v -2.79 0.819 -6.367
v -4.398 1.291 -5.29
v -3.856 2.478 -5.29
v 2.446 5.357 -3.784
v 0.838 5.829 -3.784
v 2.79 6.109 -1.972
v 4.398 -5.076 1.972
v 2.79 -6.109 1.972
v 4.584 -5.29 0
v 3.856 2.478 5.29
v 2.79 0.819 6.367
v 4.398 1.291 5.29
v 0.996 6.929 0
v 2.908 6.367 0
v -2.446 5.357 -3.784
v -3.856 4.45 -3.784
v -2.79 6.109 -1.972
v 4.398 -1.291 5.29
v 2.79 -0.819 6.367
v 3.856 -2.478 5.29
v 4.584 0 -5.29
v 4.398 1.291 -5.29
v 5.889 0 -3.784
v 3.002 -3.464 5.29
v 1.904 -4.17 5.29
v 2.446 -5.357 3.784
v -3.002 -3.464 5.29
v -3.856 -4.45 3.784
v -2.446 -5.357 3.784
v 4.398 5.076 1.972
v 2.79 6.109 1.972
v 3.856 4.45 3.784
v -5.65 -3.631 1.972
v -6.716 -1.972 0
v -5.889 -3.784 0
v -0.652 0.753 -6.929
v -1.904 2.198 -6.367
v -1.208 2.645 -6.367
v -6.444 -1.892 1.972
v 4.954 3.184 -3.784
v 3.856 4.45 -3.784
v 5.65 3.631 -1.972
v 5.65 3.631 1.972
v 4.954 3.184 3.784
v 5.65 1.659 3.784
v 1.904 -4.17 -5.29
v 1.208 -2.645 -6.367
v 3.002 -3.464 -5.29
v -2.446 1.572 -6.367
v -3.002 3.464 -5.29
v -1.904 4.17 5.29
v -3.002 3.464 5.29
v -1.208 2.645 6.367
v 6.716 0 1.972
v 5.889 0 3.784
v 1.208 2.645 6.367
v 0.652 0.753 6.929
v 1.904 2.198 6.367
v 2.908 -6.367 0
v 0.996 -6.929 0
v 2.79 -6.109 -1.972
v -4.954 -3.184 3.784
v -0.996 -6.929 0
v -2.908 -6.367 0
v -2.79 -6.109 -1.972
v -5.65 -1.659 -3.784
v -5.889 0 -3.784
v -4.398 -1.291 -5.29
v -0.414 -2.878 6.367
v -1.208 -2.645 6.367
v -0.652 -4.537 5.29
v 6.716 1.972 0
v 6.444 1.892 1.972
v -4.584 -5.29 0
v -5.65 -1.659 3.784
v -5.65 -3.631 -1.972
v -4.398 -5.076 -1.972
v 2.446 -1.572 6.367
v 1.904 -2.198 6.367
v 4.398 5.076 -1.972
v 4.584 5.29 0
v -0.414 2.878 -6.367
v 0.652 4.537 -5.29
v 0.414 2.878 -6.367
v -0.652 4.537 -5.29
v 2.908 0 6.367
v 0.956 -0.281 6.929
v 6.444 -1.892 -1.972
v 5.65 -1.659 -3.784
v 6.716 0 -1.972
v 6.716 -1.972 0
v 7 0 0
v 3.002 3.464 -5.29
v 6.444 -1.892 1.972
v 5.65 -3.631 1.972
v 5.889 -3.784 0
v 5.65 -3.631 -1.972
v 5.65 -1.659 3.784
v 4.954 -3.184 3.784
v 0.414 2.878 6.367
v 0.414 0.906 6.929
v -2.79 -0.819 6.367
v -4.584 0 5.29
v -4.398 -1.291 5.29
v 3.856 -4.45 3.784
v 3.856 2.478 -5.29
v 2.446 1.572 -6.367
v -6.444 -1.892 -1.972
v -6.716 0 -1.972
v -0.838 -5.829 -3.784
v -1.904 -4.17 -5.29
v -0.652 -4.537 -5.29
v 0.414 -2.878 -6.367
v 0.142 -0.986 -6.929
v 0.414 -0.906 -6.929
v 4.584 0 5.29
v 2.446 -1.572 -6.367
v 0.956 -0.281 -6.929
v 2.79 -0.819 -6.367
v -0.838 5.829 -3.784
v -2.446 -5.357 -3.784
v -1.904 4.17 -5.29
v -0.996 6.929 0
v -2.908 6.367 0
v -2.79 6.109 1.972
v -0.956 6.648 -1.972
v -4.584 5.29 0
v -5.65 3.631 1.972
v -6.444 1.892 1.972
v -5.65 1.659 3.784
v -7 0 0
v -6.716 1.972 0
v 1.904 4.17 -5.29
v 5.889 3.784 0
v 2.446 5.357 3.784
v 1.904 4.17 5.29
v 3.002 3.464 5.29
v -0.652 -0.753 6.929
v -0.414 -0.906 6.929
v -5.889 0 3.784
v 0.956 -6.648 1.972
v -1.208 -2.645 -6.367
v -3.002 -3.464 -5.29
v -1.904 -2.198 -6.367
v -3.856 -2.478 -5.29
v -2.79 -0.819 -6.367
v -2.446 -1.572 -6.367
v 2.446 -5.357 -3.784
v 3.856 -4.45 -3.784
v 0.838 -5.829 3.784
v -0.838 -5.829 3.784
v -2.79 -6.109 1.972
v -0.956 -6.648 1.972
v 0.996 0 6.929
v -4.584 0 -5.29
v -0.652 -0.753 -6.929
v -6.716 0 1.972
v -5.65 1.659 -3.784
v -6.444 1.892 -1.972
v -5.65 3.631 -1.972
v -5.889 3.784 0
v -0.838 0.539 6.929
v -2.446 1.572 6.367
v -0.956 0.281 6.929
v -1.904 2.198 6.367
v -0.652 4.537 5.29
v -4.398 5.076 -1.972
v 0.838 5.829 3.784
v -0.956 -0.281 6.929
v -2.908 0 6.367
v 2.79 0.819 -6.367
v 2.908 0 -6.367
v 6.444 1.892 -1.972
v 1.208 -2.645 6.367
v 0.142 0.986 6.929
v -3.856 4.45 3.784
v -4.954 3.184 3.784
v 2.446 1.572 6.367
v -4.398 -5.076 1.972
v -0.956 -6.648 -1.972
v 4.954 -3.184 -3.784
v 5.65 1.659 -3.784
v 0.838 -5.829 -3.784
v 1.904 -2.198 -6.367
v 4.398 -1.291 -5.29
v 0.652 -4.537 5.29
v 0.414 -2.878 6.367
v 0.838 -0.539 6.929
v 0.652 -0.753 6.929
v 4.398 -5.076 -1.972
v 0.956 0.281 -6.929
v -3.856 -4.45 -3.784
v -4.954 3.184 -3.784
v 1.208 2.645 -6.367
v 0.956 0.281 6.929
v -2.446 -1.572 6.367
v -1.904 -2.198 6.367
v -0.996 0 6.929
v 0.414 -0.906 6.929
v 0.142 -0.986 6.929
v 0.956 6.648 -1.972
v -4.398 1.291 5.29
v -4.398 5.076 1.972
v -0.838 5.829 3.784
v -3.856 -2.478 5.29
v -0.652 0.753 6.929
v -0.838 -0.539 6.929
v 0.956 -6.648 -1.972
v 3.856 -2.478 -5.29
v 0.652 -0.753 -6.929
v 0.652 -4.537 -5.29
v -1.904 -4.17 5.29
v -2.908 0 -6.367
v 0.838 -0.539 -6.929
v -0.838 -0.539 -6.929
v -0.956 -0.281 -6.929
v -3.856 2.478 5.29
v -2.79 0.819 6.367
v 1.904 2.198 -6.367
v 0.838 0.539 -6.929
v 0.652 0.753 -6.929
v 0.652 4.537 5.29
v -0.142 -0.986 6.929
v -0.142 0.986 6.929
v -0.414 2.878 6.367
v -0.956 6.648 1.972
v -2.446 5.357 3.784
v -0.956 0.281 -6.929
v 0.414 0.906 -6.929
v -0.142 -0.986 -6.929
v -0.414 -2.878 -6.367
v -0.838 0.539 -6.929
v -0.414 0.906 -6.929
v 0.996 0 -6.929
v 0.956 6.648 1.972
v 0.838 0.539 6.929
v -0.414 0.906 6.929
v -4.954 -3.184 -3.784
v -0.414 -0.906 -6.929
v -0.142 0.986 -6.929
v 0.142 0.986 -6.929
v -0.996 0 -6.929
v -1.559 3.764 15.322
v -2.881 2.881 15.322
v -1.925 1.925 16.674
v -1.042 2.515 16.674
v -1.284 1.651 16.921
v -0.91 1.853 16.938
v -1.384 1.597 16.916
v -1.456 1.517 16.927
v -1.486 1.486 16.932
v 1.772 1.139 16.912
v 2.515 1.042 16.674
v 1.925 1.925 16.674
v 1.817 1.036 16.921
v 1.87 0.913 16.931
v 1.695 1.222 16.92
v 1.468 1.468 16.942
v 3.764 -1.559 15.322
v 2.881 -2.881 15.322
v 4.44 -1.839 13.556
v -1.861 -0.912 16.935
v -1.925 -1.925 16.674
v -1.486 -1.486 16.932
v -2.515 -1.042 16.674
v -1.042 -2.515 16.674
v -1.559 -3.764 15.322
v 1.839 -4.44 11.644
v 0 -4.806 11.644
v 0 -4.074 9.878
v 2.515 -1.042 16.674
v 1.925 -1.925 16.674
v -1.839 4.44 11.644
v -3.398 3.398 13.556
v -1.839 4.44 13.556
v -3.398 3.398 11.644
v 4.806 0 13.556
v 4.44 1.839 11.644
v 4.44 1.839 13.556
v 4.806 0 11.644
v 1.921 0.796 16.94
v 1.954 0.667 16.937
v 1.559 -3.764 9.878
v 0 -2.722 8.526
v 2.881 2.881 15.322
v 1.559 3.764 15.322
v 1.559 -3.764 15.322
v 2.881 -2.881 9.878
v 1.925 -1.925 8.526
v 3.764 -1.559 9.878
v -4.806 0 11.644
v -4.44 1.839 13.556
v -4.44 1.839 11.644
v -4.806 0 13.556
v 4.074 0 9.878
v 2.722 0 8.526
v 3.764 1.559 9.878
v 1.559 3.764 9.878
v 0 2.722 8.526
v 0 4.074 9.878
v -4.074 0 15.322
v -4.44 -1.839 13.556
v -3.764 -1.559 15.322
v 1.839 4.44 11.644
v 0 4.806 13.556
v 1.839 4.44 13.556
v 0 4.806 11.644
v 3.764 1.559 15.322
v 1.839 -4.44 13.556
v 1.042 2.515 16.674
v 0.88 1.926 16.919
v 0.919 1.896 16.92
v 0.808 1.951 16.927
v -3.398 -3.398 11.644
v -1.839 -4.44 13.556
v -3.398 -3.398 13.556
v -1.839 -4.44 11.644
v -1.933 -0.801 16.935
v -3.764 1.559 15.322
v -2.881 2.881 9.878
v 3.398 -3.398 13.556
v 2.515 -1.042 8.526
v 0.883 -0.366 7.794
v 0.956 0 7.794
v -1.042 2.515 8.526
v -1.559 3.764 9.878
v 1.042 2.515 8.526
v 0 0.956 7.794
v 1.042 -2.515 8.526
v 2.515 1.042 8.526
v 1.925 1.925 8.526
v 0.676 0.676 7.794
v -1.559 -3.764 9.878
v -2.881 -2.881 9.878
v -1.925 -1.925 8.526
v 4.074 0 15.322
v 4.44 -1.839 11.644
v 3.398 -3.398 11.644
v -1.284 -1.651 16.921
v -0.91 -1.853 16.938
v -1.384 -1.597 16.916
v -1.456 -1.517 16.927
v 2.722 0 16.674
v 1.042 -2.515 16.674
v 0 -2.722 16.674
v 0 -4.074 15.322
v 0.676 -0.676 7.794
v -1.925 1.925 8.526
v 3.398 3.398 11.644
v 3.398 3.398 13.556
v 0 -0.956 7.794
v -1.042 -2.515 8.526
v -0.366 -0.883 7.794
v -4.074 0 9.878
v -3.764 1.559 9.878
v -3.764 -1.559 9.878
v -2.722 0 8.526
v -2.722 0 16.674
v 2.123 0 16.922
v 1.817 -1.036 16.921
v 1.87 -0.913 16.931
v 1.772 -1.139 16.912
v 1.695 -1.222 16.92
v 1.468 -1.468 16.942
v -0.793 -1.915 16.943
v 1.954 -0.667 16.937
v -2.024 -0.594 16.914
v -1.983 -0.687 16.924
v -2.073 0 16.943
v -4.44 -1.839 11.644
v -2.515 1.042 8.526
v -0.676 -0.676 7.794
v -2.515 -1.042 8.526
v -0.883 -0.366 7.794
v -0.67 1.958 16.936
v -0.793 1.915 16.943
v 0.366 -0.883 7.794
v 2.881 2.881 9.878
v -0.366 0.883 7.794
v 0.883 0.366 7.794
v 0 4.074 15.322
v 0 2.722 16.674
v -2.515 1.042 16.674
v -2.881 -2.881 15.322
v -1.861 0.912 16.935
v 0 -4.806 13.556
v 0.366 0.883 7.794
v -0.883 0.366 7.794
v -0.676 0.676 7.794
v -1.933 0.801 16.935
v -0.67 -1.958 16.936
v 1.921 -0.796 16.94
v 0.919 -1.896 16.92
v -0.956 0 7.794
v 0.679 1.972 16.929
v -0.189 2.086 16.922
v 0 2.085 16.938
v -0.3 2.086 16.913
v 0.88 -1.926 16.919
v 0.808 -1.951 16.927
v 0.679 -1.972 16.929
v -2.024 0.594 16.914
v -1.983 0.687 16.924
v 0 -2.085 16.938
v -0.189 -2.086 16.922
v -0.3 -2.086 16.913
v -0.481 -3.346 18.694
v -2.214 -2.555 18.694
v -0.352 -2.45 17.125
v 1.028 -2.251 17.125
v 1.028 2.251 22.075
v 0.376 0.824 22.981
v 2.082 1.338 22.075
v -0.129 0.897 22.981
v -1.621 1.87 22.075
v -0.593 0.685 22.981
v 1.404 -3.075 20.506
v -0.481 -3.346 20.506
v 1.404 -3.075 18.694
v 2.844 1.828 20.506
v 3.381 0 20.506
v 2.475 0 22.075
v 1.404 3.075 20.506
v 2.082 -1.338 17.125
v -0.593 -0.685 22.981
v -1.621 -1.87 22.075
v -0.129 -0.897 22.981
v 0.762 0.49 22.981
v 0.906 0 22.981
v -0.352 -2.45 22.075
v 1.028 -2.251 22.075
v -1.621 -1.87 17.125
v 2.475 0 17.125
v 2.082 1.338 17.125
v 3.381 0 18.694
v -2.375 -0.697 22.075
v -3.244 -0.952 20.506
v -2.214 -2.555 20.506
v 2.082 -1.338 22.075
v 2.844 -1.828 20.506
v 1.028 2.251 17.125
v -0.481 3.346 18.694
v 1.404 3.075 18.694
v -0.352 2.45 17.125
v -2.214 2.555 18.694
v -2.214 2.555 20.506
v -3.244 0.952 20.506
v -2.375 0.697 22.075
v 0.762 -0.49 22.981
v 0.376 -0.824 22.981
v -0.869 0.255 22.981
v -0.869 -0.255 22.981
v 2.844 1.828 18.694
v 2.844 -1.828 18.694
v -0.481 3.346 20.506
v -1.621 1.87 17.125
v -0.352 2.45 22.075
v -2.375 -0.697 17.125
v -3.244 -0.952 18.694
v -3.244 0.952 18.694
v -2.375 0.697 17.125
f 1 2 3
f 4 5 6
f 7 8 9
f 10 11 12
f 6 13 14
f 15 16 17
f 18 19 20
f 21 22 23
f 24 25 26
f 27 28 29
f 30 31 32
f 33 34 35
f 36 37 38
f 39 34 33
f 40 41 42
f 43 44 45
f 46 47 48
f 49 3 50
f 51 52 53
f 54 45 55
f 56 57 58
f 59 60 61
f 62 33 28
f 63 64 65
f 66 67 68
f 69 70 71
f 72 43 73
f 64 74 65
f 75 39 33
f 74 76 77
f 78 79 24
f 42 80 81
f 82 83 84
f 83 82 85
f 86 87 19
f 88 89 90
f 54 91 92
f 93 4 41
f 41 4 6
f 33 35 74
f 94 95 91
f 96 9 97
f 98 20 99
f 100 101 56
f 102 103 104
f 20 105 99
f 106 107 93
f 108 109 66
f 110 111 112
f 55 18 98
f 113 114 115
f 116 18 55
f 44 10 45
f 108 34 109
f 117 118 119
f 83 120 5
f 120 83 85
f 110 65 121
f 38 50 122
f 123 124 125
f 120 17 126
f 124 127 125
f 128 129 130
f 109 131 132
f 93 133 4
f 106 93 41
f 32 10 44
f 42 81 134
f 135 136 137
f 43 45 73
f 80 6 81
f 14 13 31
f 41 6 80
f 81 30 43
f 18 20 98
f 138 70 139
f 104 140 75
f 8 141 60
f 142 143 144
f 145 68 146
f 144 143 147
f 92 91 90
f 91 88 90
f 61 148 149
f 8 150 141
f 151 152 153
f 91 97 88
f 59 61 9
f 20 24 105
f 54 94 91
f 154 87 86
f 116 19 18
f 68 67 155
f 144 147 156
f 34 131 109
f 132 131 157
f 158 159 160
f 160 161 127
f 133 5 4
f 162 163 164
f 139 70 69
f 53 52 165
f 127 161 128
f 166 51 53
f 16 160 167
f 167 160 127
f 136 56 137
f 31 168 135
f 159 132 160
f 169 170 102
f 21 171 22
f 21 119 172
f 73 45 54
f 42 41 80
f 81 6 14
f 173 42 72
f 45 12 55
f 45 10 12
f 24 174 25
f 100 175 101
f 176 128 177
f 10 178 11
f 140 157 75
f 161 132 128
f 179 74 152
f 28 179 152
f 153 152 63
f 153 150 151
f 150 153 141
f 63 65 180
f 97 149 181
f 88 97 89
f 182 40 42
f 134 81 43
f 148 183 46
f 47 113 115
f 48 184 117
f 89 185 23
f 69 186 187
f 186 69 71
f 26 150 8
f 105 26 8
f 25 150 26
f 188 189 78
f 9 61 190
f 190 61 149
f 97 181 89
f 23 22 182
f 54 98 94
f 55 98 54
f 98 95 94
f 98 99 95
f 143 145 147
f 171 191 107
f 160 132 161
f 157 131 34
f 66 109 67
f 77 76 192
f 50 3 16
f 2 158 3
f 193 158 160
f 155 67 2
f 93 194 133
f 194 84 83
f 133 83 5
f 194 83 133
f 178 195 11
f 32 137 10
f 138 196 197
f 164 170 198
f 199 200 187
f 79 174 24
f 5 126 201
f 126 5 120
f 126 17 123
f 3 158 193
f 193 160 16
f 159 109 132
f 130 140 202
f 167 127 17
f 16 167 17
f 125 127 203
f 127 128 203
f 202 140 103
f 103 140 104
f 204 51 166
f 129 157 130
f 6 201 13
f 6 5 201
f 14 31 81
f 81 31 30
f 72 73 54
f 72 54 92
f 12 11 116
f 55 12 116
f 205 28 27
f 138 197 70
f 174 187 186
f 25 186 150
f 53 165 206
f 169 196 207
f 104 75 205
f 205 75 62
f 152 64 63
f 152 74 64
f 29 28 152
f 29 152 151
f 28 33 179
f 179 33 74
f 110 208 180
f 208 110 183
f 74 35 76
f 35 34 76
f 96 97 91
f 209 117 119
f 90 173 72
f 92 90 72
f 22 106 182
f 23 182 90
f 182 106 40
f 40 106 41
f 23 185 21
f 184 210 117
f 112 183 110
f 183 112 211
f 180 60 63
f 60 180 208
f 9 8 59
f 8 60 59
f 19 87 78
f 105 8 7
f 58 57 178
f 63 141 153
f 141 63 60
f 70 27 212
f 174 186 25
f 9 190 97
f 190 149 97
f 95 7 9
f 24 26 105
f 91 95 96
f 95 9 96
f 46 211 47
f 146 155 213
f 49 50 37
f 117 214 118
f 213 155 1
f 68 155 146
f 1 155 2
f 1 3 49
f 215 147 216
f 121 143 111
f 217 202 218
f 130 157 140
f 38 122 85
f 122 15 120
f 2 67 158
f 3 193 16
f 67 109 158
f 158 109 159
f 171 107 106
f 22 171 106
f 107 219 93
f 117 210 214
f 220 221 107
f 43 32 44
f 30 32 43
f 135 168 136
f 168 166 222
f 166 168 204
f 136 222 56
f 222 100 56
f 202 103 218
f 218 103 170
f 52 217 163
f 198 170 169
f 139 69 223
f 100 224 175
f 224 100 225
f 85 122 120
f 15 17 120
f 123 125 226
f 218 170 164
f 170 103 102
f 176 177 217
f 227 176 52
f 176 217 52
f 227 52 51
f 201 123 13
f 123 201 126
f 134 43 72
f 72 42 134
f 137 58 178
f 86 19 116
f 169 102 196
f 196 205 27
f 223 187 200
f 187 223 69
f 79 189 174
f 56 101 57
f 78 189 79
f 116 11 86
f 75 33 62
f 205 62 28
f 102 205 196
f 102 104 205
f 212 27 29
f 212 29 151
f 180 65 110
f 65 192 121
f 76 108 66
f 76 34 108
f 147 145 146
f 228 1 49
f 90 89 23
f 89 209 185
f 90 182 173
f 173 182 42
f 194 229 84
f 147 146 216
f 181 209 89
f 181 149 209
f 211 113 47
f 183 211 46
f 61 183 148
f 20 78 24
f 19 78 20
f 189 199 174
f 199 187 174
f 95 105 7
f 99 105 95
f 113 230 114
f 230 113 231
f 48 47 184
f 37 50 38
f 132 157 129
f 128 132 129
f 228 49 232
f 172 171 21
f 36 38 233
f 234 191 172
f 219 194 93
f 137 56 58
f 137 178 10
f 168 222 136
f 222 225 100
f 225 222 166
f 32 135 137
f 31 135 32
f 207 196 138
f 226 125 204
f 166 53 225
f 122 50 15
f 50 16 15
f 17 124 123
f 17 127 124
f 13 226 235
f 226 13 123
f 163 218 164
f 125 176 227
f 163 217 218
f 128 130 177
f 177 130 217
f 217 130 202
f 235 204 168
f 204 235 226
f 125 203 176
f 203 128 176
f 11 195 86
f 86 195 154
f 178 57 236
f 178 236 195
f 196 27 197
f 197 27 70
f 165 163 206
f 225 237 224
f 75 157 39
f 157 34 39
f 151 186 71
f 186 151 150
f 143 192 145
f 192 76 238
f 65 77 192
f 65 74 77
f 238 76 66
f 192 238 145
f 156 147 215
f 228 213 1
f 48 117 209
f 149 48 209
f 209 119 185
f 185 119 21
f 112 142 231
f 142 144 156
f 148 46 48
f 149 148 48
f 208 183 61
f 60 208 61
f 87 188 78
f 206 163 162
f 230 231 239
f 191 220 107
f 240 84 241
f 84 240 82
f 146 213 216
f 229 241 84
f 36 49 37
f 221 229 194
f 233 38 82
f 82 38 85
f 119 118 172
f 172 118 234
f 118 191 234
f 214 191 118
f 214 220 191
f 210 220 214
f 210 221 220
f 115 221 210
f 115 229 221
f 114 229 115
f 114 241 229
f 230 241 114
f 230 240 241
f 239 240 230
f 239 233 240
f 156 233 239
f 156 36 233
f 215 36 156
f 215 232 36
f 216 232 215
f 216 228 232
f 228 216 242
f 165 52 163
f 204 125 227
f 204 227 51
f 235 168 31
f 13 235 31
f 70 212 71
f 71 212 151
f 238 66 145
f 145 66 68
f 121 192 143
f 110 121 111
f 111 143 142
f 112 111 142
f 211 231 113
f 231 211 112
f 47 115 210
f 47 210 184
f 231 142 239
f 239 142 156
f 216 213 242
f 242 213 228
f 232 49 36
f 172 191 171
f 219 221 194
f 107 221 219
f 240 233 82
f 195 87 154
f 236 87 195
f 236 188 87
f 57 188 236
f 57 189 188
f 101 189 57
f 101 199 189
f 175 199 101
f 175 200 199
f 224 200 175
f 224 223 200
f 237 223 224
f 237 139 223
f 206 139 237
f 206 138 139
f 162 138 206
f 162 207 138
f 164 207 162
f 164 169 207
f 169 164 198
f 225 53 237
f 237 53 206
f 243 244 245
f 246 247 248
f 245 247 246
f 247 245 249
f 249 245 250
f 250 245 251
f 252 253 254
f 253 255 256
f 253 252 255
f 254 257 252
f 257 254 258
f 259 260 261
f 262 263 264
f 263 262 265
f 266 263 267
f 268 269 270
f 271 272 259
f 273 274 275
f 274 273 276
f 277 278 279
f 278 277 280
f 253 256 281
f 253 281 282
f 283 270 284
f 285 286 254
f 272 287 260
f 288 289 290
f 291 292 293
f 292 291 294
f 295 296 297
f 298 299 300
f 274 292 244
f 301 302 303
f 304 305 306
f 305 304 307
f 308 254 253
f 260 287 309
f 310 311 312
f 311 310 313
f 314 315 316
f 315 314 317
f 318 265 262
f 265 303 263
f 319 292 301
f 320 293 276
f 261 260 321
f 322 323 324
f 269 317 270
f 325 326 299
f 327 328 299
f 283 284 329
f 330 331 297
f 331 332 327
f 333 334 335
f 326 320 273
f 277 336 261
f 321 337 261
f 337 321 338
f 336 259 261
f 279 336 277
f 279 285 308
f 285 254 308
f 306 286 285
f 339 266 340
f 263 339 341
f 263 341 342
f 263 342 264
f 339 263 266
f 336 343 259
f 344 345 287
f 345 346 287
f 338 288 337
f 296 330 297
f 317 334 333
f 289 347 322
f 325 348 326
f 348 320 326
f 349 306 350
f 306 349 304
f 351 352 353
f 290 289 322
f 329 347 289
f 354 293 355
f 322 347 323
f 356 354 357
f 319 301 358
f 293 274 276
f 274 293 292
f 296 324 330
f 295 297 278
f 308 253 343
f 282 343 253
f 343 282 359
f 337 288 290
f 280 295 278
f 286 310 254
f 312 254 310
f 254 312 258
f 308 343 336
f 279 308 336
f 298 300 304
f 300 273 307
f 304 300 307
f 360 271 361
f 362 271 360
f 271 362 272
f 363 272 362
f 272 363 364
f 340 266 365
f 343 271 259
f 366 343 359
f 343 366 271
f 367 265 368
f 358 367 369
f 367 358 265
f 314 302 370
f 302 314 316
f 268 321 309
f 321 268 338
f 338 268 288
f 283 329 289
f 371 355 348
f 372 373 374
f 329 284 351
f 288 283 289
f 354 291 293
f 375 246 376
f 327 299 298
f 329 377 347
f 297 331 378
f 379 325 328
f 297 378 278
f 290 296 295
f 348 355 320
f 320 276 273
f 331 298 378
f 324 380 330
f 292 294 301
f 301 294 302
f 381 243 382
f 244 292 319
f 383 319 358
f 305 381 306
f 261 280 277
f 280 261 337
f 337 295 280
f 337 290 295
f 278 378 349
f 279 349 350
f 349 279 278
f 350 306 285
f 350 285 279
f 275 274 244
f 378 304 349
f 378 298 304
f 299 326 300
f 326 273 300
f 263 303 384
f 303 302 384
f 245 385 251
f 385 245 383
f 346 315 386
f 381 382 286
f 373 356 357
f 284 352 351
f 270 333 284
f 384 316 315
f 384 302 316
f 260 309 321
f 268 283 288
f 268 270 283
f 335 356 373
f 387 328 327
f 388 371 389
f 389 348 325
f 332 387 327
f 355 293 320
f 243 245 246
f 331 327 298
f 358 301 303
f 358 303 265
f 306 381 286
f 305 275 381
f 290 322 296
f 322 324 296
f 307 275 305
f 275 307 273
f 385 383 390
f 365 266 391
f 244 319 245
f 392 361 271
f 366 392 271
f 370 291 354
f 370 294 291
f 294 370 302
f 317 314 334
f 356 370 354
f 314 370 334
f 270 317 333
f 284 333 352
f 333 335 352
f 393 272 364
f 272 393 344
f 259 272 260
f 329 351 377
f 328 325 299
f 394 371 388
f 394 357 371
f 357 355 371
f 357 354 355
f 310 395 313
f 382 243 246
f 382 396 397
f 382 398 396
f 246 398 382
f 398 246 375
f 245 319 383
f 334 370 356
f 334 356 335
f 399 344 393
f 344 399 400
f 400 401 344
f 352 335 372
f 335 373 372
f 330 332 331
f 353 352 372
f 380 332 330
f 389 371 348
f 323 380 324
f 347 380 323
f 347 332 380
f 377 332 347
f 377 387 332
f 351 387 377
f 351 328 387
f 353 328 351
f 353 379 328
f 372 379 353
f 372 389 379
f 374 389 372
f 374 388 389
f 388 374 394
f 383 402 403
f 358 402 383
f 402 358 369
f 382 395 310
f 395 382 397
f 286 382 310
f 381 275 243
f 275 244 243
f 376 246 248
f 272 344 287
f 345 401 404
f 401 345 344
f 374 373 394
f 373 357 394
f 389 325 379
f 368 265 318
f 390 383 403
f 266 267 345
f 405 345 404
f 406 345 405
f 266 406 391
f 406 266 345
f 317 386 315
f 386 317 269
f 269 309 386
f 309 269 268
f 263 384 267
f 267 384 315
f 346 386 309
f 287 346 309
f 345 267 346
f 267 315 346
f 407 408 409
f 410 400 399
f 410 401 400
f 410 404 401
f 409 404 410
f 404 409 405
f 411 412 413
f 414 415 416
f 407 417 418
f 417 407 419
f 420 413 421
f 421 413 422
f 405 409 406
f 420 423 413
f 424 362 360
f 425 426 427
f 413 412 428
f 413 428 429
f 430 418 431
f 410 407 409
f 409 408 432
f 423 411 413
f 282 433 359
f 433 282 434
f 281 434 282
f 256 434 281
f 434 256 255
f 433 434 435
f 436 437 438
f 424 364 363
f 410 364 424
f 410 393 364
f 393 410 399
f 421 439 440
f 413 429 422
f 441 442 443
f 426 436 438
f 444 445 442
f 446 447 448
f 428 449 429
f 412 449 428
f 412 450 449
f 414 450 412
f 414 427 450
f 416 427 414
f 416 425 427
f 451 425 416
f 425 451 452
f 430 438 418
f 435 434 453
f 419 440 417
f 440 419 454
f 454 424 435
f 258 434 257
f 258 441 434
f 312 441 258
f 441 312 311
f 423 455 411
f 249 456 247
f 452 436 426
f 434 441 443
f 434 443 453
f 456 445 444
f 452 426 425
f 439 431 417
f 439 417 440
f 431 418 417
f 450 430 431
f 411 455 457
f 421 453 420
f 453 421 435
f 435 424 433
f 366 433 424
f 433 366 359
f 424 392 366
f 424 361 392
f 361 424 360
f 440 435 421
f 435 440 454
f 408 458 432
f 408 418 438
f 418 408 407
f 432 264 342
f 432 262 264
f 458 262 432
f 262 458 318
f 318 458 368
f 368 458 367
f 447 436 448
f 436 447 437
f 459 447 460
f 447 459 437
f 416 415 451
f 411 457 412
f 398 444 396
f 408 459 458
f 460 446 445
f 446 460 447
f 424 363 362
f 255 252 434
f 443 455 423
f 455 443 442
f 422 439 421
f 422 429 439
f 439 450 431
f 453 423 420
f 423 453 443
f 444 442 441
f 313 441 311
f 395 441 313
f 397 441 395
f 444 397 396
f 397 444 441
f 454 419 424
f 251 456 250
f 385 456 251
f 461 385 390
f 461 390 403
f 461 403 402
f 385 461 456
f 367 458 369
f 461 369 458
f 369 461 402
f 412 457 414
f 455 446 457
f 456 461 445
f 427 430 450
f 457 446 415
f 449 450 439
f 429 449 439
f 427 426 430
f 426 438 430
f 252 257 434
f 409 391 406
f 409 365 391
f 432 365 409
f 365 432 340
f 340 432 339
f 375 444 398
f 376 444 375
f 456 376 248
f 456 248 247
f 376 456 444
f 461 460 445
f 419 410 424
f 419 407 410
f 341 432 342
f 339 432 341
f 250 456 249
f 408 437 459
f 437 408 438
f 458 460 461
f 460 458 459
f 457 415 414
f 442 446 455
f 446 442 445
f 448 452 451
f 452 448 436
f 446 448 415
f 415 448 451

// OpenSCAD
union() {
  sphere(r=7.0);
  translate([0.0,0.0,12.6]) sphere(r=4.9);
  translate([0.0,0.0,19.6]) sphere(r=3.5);
}
